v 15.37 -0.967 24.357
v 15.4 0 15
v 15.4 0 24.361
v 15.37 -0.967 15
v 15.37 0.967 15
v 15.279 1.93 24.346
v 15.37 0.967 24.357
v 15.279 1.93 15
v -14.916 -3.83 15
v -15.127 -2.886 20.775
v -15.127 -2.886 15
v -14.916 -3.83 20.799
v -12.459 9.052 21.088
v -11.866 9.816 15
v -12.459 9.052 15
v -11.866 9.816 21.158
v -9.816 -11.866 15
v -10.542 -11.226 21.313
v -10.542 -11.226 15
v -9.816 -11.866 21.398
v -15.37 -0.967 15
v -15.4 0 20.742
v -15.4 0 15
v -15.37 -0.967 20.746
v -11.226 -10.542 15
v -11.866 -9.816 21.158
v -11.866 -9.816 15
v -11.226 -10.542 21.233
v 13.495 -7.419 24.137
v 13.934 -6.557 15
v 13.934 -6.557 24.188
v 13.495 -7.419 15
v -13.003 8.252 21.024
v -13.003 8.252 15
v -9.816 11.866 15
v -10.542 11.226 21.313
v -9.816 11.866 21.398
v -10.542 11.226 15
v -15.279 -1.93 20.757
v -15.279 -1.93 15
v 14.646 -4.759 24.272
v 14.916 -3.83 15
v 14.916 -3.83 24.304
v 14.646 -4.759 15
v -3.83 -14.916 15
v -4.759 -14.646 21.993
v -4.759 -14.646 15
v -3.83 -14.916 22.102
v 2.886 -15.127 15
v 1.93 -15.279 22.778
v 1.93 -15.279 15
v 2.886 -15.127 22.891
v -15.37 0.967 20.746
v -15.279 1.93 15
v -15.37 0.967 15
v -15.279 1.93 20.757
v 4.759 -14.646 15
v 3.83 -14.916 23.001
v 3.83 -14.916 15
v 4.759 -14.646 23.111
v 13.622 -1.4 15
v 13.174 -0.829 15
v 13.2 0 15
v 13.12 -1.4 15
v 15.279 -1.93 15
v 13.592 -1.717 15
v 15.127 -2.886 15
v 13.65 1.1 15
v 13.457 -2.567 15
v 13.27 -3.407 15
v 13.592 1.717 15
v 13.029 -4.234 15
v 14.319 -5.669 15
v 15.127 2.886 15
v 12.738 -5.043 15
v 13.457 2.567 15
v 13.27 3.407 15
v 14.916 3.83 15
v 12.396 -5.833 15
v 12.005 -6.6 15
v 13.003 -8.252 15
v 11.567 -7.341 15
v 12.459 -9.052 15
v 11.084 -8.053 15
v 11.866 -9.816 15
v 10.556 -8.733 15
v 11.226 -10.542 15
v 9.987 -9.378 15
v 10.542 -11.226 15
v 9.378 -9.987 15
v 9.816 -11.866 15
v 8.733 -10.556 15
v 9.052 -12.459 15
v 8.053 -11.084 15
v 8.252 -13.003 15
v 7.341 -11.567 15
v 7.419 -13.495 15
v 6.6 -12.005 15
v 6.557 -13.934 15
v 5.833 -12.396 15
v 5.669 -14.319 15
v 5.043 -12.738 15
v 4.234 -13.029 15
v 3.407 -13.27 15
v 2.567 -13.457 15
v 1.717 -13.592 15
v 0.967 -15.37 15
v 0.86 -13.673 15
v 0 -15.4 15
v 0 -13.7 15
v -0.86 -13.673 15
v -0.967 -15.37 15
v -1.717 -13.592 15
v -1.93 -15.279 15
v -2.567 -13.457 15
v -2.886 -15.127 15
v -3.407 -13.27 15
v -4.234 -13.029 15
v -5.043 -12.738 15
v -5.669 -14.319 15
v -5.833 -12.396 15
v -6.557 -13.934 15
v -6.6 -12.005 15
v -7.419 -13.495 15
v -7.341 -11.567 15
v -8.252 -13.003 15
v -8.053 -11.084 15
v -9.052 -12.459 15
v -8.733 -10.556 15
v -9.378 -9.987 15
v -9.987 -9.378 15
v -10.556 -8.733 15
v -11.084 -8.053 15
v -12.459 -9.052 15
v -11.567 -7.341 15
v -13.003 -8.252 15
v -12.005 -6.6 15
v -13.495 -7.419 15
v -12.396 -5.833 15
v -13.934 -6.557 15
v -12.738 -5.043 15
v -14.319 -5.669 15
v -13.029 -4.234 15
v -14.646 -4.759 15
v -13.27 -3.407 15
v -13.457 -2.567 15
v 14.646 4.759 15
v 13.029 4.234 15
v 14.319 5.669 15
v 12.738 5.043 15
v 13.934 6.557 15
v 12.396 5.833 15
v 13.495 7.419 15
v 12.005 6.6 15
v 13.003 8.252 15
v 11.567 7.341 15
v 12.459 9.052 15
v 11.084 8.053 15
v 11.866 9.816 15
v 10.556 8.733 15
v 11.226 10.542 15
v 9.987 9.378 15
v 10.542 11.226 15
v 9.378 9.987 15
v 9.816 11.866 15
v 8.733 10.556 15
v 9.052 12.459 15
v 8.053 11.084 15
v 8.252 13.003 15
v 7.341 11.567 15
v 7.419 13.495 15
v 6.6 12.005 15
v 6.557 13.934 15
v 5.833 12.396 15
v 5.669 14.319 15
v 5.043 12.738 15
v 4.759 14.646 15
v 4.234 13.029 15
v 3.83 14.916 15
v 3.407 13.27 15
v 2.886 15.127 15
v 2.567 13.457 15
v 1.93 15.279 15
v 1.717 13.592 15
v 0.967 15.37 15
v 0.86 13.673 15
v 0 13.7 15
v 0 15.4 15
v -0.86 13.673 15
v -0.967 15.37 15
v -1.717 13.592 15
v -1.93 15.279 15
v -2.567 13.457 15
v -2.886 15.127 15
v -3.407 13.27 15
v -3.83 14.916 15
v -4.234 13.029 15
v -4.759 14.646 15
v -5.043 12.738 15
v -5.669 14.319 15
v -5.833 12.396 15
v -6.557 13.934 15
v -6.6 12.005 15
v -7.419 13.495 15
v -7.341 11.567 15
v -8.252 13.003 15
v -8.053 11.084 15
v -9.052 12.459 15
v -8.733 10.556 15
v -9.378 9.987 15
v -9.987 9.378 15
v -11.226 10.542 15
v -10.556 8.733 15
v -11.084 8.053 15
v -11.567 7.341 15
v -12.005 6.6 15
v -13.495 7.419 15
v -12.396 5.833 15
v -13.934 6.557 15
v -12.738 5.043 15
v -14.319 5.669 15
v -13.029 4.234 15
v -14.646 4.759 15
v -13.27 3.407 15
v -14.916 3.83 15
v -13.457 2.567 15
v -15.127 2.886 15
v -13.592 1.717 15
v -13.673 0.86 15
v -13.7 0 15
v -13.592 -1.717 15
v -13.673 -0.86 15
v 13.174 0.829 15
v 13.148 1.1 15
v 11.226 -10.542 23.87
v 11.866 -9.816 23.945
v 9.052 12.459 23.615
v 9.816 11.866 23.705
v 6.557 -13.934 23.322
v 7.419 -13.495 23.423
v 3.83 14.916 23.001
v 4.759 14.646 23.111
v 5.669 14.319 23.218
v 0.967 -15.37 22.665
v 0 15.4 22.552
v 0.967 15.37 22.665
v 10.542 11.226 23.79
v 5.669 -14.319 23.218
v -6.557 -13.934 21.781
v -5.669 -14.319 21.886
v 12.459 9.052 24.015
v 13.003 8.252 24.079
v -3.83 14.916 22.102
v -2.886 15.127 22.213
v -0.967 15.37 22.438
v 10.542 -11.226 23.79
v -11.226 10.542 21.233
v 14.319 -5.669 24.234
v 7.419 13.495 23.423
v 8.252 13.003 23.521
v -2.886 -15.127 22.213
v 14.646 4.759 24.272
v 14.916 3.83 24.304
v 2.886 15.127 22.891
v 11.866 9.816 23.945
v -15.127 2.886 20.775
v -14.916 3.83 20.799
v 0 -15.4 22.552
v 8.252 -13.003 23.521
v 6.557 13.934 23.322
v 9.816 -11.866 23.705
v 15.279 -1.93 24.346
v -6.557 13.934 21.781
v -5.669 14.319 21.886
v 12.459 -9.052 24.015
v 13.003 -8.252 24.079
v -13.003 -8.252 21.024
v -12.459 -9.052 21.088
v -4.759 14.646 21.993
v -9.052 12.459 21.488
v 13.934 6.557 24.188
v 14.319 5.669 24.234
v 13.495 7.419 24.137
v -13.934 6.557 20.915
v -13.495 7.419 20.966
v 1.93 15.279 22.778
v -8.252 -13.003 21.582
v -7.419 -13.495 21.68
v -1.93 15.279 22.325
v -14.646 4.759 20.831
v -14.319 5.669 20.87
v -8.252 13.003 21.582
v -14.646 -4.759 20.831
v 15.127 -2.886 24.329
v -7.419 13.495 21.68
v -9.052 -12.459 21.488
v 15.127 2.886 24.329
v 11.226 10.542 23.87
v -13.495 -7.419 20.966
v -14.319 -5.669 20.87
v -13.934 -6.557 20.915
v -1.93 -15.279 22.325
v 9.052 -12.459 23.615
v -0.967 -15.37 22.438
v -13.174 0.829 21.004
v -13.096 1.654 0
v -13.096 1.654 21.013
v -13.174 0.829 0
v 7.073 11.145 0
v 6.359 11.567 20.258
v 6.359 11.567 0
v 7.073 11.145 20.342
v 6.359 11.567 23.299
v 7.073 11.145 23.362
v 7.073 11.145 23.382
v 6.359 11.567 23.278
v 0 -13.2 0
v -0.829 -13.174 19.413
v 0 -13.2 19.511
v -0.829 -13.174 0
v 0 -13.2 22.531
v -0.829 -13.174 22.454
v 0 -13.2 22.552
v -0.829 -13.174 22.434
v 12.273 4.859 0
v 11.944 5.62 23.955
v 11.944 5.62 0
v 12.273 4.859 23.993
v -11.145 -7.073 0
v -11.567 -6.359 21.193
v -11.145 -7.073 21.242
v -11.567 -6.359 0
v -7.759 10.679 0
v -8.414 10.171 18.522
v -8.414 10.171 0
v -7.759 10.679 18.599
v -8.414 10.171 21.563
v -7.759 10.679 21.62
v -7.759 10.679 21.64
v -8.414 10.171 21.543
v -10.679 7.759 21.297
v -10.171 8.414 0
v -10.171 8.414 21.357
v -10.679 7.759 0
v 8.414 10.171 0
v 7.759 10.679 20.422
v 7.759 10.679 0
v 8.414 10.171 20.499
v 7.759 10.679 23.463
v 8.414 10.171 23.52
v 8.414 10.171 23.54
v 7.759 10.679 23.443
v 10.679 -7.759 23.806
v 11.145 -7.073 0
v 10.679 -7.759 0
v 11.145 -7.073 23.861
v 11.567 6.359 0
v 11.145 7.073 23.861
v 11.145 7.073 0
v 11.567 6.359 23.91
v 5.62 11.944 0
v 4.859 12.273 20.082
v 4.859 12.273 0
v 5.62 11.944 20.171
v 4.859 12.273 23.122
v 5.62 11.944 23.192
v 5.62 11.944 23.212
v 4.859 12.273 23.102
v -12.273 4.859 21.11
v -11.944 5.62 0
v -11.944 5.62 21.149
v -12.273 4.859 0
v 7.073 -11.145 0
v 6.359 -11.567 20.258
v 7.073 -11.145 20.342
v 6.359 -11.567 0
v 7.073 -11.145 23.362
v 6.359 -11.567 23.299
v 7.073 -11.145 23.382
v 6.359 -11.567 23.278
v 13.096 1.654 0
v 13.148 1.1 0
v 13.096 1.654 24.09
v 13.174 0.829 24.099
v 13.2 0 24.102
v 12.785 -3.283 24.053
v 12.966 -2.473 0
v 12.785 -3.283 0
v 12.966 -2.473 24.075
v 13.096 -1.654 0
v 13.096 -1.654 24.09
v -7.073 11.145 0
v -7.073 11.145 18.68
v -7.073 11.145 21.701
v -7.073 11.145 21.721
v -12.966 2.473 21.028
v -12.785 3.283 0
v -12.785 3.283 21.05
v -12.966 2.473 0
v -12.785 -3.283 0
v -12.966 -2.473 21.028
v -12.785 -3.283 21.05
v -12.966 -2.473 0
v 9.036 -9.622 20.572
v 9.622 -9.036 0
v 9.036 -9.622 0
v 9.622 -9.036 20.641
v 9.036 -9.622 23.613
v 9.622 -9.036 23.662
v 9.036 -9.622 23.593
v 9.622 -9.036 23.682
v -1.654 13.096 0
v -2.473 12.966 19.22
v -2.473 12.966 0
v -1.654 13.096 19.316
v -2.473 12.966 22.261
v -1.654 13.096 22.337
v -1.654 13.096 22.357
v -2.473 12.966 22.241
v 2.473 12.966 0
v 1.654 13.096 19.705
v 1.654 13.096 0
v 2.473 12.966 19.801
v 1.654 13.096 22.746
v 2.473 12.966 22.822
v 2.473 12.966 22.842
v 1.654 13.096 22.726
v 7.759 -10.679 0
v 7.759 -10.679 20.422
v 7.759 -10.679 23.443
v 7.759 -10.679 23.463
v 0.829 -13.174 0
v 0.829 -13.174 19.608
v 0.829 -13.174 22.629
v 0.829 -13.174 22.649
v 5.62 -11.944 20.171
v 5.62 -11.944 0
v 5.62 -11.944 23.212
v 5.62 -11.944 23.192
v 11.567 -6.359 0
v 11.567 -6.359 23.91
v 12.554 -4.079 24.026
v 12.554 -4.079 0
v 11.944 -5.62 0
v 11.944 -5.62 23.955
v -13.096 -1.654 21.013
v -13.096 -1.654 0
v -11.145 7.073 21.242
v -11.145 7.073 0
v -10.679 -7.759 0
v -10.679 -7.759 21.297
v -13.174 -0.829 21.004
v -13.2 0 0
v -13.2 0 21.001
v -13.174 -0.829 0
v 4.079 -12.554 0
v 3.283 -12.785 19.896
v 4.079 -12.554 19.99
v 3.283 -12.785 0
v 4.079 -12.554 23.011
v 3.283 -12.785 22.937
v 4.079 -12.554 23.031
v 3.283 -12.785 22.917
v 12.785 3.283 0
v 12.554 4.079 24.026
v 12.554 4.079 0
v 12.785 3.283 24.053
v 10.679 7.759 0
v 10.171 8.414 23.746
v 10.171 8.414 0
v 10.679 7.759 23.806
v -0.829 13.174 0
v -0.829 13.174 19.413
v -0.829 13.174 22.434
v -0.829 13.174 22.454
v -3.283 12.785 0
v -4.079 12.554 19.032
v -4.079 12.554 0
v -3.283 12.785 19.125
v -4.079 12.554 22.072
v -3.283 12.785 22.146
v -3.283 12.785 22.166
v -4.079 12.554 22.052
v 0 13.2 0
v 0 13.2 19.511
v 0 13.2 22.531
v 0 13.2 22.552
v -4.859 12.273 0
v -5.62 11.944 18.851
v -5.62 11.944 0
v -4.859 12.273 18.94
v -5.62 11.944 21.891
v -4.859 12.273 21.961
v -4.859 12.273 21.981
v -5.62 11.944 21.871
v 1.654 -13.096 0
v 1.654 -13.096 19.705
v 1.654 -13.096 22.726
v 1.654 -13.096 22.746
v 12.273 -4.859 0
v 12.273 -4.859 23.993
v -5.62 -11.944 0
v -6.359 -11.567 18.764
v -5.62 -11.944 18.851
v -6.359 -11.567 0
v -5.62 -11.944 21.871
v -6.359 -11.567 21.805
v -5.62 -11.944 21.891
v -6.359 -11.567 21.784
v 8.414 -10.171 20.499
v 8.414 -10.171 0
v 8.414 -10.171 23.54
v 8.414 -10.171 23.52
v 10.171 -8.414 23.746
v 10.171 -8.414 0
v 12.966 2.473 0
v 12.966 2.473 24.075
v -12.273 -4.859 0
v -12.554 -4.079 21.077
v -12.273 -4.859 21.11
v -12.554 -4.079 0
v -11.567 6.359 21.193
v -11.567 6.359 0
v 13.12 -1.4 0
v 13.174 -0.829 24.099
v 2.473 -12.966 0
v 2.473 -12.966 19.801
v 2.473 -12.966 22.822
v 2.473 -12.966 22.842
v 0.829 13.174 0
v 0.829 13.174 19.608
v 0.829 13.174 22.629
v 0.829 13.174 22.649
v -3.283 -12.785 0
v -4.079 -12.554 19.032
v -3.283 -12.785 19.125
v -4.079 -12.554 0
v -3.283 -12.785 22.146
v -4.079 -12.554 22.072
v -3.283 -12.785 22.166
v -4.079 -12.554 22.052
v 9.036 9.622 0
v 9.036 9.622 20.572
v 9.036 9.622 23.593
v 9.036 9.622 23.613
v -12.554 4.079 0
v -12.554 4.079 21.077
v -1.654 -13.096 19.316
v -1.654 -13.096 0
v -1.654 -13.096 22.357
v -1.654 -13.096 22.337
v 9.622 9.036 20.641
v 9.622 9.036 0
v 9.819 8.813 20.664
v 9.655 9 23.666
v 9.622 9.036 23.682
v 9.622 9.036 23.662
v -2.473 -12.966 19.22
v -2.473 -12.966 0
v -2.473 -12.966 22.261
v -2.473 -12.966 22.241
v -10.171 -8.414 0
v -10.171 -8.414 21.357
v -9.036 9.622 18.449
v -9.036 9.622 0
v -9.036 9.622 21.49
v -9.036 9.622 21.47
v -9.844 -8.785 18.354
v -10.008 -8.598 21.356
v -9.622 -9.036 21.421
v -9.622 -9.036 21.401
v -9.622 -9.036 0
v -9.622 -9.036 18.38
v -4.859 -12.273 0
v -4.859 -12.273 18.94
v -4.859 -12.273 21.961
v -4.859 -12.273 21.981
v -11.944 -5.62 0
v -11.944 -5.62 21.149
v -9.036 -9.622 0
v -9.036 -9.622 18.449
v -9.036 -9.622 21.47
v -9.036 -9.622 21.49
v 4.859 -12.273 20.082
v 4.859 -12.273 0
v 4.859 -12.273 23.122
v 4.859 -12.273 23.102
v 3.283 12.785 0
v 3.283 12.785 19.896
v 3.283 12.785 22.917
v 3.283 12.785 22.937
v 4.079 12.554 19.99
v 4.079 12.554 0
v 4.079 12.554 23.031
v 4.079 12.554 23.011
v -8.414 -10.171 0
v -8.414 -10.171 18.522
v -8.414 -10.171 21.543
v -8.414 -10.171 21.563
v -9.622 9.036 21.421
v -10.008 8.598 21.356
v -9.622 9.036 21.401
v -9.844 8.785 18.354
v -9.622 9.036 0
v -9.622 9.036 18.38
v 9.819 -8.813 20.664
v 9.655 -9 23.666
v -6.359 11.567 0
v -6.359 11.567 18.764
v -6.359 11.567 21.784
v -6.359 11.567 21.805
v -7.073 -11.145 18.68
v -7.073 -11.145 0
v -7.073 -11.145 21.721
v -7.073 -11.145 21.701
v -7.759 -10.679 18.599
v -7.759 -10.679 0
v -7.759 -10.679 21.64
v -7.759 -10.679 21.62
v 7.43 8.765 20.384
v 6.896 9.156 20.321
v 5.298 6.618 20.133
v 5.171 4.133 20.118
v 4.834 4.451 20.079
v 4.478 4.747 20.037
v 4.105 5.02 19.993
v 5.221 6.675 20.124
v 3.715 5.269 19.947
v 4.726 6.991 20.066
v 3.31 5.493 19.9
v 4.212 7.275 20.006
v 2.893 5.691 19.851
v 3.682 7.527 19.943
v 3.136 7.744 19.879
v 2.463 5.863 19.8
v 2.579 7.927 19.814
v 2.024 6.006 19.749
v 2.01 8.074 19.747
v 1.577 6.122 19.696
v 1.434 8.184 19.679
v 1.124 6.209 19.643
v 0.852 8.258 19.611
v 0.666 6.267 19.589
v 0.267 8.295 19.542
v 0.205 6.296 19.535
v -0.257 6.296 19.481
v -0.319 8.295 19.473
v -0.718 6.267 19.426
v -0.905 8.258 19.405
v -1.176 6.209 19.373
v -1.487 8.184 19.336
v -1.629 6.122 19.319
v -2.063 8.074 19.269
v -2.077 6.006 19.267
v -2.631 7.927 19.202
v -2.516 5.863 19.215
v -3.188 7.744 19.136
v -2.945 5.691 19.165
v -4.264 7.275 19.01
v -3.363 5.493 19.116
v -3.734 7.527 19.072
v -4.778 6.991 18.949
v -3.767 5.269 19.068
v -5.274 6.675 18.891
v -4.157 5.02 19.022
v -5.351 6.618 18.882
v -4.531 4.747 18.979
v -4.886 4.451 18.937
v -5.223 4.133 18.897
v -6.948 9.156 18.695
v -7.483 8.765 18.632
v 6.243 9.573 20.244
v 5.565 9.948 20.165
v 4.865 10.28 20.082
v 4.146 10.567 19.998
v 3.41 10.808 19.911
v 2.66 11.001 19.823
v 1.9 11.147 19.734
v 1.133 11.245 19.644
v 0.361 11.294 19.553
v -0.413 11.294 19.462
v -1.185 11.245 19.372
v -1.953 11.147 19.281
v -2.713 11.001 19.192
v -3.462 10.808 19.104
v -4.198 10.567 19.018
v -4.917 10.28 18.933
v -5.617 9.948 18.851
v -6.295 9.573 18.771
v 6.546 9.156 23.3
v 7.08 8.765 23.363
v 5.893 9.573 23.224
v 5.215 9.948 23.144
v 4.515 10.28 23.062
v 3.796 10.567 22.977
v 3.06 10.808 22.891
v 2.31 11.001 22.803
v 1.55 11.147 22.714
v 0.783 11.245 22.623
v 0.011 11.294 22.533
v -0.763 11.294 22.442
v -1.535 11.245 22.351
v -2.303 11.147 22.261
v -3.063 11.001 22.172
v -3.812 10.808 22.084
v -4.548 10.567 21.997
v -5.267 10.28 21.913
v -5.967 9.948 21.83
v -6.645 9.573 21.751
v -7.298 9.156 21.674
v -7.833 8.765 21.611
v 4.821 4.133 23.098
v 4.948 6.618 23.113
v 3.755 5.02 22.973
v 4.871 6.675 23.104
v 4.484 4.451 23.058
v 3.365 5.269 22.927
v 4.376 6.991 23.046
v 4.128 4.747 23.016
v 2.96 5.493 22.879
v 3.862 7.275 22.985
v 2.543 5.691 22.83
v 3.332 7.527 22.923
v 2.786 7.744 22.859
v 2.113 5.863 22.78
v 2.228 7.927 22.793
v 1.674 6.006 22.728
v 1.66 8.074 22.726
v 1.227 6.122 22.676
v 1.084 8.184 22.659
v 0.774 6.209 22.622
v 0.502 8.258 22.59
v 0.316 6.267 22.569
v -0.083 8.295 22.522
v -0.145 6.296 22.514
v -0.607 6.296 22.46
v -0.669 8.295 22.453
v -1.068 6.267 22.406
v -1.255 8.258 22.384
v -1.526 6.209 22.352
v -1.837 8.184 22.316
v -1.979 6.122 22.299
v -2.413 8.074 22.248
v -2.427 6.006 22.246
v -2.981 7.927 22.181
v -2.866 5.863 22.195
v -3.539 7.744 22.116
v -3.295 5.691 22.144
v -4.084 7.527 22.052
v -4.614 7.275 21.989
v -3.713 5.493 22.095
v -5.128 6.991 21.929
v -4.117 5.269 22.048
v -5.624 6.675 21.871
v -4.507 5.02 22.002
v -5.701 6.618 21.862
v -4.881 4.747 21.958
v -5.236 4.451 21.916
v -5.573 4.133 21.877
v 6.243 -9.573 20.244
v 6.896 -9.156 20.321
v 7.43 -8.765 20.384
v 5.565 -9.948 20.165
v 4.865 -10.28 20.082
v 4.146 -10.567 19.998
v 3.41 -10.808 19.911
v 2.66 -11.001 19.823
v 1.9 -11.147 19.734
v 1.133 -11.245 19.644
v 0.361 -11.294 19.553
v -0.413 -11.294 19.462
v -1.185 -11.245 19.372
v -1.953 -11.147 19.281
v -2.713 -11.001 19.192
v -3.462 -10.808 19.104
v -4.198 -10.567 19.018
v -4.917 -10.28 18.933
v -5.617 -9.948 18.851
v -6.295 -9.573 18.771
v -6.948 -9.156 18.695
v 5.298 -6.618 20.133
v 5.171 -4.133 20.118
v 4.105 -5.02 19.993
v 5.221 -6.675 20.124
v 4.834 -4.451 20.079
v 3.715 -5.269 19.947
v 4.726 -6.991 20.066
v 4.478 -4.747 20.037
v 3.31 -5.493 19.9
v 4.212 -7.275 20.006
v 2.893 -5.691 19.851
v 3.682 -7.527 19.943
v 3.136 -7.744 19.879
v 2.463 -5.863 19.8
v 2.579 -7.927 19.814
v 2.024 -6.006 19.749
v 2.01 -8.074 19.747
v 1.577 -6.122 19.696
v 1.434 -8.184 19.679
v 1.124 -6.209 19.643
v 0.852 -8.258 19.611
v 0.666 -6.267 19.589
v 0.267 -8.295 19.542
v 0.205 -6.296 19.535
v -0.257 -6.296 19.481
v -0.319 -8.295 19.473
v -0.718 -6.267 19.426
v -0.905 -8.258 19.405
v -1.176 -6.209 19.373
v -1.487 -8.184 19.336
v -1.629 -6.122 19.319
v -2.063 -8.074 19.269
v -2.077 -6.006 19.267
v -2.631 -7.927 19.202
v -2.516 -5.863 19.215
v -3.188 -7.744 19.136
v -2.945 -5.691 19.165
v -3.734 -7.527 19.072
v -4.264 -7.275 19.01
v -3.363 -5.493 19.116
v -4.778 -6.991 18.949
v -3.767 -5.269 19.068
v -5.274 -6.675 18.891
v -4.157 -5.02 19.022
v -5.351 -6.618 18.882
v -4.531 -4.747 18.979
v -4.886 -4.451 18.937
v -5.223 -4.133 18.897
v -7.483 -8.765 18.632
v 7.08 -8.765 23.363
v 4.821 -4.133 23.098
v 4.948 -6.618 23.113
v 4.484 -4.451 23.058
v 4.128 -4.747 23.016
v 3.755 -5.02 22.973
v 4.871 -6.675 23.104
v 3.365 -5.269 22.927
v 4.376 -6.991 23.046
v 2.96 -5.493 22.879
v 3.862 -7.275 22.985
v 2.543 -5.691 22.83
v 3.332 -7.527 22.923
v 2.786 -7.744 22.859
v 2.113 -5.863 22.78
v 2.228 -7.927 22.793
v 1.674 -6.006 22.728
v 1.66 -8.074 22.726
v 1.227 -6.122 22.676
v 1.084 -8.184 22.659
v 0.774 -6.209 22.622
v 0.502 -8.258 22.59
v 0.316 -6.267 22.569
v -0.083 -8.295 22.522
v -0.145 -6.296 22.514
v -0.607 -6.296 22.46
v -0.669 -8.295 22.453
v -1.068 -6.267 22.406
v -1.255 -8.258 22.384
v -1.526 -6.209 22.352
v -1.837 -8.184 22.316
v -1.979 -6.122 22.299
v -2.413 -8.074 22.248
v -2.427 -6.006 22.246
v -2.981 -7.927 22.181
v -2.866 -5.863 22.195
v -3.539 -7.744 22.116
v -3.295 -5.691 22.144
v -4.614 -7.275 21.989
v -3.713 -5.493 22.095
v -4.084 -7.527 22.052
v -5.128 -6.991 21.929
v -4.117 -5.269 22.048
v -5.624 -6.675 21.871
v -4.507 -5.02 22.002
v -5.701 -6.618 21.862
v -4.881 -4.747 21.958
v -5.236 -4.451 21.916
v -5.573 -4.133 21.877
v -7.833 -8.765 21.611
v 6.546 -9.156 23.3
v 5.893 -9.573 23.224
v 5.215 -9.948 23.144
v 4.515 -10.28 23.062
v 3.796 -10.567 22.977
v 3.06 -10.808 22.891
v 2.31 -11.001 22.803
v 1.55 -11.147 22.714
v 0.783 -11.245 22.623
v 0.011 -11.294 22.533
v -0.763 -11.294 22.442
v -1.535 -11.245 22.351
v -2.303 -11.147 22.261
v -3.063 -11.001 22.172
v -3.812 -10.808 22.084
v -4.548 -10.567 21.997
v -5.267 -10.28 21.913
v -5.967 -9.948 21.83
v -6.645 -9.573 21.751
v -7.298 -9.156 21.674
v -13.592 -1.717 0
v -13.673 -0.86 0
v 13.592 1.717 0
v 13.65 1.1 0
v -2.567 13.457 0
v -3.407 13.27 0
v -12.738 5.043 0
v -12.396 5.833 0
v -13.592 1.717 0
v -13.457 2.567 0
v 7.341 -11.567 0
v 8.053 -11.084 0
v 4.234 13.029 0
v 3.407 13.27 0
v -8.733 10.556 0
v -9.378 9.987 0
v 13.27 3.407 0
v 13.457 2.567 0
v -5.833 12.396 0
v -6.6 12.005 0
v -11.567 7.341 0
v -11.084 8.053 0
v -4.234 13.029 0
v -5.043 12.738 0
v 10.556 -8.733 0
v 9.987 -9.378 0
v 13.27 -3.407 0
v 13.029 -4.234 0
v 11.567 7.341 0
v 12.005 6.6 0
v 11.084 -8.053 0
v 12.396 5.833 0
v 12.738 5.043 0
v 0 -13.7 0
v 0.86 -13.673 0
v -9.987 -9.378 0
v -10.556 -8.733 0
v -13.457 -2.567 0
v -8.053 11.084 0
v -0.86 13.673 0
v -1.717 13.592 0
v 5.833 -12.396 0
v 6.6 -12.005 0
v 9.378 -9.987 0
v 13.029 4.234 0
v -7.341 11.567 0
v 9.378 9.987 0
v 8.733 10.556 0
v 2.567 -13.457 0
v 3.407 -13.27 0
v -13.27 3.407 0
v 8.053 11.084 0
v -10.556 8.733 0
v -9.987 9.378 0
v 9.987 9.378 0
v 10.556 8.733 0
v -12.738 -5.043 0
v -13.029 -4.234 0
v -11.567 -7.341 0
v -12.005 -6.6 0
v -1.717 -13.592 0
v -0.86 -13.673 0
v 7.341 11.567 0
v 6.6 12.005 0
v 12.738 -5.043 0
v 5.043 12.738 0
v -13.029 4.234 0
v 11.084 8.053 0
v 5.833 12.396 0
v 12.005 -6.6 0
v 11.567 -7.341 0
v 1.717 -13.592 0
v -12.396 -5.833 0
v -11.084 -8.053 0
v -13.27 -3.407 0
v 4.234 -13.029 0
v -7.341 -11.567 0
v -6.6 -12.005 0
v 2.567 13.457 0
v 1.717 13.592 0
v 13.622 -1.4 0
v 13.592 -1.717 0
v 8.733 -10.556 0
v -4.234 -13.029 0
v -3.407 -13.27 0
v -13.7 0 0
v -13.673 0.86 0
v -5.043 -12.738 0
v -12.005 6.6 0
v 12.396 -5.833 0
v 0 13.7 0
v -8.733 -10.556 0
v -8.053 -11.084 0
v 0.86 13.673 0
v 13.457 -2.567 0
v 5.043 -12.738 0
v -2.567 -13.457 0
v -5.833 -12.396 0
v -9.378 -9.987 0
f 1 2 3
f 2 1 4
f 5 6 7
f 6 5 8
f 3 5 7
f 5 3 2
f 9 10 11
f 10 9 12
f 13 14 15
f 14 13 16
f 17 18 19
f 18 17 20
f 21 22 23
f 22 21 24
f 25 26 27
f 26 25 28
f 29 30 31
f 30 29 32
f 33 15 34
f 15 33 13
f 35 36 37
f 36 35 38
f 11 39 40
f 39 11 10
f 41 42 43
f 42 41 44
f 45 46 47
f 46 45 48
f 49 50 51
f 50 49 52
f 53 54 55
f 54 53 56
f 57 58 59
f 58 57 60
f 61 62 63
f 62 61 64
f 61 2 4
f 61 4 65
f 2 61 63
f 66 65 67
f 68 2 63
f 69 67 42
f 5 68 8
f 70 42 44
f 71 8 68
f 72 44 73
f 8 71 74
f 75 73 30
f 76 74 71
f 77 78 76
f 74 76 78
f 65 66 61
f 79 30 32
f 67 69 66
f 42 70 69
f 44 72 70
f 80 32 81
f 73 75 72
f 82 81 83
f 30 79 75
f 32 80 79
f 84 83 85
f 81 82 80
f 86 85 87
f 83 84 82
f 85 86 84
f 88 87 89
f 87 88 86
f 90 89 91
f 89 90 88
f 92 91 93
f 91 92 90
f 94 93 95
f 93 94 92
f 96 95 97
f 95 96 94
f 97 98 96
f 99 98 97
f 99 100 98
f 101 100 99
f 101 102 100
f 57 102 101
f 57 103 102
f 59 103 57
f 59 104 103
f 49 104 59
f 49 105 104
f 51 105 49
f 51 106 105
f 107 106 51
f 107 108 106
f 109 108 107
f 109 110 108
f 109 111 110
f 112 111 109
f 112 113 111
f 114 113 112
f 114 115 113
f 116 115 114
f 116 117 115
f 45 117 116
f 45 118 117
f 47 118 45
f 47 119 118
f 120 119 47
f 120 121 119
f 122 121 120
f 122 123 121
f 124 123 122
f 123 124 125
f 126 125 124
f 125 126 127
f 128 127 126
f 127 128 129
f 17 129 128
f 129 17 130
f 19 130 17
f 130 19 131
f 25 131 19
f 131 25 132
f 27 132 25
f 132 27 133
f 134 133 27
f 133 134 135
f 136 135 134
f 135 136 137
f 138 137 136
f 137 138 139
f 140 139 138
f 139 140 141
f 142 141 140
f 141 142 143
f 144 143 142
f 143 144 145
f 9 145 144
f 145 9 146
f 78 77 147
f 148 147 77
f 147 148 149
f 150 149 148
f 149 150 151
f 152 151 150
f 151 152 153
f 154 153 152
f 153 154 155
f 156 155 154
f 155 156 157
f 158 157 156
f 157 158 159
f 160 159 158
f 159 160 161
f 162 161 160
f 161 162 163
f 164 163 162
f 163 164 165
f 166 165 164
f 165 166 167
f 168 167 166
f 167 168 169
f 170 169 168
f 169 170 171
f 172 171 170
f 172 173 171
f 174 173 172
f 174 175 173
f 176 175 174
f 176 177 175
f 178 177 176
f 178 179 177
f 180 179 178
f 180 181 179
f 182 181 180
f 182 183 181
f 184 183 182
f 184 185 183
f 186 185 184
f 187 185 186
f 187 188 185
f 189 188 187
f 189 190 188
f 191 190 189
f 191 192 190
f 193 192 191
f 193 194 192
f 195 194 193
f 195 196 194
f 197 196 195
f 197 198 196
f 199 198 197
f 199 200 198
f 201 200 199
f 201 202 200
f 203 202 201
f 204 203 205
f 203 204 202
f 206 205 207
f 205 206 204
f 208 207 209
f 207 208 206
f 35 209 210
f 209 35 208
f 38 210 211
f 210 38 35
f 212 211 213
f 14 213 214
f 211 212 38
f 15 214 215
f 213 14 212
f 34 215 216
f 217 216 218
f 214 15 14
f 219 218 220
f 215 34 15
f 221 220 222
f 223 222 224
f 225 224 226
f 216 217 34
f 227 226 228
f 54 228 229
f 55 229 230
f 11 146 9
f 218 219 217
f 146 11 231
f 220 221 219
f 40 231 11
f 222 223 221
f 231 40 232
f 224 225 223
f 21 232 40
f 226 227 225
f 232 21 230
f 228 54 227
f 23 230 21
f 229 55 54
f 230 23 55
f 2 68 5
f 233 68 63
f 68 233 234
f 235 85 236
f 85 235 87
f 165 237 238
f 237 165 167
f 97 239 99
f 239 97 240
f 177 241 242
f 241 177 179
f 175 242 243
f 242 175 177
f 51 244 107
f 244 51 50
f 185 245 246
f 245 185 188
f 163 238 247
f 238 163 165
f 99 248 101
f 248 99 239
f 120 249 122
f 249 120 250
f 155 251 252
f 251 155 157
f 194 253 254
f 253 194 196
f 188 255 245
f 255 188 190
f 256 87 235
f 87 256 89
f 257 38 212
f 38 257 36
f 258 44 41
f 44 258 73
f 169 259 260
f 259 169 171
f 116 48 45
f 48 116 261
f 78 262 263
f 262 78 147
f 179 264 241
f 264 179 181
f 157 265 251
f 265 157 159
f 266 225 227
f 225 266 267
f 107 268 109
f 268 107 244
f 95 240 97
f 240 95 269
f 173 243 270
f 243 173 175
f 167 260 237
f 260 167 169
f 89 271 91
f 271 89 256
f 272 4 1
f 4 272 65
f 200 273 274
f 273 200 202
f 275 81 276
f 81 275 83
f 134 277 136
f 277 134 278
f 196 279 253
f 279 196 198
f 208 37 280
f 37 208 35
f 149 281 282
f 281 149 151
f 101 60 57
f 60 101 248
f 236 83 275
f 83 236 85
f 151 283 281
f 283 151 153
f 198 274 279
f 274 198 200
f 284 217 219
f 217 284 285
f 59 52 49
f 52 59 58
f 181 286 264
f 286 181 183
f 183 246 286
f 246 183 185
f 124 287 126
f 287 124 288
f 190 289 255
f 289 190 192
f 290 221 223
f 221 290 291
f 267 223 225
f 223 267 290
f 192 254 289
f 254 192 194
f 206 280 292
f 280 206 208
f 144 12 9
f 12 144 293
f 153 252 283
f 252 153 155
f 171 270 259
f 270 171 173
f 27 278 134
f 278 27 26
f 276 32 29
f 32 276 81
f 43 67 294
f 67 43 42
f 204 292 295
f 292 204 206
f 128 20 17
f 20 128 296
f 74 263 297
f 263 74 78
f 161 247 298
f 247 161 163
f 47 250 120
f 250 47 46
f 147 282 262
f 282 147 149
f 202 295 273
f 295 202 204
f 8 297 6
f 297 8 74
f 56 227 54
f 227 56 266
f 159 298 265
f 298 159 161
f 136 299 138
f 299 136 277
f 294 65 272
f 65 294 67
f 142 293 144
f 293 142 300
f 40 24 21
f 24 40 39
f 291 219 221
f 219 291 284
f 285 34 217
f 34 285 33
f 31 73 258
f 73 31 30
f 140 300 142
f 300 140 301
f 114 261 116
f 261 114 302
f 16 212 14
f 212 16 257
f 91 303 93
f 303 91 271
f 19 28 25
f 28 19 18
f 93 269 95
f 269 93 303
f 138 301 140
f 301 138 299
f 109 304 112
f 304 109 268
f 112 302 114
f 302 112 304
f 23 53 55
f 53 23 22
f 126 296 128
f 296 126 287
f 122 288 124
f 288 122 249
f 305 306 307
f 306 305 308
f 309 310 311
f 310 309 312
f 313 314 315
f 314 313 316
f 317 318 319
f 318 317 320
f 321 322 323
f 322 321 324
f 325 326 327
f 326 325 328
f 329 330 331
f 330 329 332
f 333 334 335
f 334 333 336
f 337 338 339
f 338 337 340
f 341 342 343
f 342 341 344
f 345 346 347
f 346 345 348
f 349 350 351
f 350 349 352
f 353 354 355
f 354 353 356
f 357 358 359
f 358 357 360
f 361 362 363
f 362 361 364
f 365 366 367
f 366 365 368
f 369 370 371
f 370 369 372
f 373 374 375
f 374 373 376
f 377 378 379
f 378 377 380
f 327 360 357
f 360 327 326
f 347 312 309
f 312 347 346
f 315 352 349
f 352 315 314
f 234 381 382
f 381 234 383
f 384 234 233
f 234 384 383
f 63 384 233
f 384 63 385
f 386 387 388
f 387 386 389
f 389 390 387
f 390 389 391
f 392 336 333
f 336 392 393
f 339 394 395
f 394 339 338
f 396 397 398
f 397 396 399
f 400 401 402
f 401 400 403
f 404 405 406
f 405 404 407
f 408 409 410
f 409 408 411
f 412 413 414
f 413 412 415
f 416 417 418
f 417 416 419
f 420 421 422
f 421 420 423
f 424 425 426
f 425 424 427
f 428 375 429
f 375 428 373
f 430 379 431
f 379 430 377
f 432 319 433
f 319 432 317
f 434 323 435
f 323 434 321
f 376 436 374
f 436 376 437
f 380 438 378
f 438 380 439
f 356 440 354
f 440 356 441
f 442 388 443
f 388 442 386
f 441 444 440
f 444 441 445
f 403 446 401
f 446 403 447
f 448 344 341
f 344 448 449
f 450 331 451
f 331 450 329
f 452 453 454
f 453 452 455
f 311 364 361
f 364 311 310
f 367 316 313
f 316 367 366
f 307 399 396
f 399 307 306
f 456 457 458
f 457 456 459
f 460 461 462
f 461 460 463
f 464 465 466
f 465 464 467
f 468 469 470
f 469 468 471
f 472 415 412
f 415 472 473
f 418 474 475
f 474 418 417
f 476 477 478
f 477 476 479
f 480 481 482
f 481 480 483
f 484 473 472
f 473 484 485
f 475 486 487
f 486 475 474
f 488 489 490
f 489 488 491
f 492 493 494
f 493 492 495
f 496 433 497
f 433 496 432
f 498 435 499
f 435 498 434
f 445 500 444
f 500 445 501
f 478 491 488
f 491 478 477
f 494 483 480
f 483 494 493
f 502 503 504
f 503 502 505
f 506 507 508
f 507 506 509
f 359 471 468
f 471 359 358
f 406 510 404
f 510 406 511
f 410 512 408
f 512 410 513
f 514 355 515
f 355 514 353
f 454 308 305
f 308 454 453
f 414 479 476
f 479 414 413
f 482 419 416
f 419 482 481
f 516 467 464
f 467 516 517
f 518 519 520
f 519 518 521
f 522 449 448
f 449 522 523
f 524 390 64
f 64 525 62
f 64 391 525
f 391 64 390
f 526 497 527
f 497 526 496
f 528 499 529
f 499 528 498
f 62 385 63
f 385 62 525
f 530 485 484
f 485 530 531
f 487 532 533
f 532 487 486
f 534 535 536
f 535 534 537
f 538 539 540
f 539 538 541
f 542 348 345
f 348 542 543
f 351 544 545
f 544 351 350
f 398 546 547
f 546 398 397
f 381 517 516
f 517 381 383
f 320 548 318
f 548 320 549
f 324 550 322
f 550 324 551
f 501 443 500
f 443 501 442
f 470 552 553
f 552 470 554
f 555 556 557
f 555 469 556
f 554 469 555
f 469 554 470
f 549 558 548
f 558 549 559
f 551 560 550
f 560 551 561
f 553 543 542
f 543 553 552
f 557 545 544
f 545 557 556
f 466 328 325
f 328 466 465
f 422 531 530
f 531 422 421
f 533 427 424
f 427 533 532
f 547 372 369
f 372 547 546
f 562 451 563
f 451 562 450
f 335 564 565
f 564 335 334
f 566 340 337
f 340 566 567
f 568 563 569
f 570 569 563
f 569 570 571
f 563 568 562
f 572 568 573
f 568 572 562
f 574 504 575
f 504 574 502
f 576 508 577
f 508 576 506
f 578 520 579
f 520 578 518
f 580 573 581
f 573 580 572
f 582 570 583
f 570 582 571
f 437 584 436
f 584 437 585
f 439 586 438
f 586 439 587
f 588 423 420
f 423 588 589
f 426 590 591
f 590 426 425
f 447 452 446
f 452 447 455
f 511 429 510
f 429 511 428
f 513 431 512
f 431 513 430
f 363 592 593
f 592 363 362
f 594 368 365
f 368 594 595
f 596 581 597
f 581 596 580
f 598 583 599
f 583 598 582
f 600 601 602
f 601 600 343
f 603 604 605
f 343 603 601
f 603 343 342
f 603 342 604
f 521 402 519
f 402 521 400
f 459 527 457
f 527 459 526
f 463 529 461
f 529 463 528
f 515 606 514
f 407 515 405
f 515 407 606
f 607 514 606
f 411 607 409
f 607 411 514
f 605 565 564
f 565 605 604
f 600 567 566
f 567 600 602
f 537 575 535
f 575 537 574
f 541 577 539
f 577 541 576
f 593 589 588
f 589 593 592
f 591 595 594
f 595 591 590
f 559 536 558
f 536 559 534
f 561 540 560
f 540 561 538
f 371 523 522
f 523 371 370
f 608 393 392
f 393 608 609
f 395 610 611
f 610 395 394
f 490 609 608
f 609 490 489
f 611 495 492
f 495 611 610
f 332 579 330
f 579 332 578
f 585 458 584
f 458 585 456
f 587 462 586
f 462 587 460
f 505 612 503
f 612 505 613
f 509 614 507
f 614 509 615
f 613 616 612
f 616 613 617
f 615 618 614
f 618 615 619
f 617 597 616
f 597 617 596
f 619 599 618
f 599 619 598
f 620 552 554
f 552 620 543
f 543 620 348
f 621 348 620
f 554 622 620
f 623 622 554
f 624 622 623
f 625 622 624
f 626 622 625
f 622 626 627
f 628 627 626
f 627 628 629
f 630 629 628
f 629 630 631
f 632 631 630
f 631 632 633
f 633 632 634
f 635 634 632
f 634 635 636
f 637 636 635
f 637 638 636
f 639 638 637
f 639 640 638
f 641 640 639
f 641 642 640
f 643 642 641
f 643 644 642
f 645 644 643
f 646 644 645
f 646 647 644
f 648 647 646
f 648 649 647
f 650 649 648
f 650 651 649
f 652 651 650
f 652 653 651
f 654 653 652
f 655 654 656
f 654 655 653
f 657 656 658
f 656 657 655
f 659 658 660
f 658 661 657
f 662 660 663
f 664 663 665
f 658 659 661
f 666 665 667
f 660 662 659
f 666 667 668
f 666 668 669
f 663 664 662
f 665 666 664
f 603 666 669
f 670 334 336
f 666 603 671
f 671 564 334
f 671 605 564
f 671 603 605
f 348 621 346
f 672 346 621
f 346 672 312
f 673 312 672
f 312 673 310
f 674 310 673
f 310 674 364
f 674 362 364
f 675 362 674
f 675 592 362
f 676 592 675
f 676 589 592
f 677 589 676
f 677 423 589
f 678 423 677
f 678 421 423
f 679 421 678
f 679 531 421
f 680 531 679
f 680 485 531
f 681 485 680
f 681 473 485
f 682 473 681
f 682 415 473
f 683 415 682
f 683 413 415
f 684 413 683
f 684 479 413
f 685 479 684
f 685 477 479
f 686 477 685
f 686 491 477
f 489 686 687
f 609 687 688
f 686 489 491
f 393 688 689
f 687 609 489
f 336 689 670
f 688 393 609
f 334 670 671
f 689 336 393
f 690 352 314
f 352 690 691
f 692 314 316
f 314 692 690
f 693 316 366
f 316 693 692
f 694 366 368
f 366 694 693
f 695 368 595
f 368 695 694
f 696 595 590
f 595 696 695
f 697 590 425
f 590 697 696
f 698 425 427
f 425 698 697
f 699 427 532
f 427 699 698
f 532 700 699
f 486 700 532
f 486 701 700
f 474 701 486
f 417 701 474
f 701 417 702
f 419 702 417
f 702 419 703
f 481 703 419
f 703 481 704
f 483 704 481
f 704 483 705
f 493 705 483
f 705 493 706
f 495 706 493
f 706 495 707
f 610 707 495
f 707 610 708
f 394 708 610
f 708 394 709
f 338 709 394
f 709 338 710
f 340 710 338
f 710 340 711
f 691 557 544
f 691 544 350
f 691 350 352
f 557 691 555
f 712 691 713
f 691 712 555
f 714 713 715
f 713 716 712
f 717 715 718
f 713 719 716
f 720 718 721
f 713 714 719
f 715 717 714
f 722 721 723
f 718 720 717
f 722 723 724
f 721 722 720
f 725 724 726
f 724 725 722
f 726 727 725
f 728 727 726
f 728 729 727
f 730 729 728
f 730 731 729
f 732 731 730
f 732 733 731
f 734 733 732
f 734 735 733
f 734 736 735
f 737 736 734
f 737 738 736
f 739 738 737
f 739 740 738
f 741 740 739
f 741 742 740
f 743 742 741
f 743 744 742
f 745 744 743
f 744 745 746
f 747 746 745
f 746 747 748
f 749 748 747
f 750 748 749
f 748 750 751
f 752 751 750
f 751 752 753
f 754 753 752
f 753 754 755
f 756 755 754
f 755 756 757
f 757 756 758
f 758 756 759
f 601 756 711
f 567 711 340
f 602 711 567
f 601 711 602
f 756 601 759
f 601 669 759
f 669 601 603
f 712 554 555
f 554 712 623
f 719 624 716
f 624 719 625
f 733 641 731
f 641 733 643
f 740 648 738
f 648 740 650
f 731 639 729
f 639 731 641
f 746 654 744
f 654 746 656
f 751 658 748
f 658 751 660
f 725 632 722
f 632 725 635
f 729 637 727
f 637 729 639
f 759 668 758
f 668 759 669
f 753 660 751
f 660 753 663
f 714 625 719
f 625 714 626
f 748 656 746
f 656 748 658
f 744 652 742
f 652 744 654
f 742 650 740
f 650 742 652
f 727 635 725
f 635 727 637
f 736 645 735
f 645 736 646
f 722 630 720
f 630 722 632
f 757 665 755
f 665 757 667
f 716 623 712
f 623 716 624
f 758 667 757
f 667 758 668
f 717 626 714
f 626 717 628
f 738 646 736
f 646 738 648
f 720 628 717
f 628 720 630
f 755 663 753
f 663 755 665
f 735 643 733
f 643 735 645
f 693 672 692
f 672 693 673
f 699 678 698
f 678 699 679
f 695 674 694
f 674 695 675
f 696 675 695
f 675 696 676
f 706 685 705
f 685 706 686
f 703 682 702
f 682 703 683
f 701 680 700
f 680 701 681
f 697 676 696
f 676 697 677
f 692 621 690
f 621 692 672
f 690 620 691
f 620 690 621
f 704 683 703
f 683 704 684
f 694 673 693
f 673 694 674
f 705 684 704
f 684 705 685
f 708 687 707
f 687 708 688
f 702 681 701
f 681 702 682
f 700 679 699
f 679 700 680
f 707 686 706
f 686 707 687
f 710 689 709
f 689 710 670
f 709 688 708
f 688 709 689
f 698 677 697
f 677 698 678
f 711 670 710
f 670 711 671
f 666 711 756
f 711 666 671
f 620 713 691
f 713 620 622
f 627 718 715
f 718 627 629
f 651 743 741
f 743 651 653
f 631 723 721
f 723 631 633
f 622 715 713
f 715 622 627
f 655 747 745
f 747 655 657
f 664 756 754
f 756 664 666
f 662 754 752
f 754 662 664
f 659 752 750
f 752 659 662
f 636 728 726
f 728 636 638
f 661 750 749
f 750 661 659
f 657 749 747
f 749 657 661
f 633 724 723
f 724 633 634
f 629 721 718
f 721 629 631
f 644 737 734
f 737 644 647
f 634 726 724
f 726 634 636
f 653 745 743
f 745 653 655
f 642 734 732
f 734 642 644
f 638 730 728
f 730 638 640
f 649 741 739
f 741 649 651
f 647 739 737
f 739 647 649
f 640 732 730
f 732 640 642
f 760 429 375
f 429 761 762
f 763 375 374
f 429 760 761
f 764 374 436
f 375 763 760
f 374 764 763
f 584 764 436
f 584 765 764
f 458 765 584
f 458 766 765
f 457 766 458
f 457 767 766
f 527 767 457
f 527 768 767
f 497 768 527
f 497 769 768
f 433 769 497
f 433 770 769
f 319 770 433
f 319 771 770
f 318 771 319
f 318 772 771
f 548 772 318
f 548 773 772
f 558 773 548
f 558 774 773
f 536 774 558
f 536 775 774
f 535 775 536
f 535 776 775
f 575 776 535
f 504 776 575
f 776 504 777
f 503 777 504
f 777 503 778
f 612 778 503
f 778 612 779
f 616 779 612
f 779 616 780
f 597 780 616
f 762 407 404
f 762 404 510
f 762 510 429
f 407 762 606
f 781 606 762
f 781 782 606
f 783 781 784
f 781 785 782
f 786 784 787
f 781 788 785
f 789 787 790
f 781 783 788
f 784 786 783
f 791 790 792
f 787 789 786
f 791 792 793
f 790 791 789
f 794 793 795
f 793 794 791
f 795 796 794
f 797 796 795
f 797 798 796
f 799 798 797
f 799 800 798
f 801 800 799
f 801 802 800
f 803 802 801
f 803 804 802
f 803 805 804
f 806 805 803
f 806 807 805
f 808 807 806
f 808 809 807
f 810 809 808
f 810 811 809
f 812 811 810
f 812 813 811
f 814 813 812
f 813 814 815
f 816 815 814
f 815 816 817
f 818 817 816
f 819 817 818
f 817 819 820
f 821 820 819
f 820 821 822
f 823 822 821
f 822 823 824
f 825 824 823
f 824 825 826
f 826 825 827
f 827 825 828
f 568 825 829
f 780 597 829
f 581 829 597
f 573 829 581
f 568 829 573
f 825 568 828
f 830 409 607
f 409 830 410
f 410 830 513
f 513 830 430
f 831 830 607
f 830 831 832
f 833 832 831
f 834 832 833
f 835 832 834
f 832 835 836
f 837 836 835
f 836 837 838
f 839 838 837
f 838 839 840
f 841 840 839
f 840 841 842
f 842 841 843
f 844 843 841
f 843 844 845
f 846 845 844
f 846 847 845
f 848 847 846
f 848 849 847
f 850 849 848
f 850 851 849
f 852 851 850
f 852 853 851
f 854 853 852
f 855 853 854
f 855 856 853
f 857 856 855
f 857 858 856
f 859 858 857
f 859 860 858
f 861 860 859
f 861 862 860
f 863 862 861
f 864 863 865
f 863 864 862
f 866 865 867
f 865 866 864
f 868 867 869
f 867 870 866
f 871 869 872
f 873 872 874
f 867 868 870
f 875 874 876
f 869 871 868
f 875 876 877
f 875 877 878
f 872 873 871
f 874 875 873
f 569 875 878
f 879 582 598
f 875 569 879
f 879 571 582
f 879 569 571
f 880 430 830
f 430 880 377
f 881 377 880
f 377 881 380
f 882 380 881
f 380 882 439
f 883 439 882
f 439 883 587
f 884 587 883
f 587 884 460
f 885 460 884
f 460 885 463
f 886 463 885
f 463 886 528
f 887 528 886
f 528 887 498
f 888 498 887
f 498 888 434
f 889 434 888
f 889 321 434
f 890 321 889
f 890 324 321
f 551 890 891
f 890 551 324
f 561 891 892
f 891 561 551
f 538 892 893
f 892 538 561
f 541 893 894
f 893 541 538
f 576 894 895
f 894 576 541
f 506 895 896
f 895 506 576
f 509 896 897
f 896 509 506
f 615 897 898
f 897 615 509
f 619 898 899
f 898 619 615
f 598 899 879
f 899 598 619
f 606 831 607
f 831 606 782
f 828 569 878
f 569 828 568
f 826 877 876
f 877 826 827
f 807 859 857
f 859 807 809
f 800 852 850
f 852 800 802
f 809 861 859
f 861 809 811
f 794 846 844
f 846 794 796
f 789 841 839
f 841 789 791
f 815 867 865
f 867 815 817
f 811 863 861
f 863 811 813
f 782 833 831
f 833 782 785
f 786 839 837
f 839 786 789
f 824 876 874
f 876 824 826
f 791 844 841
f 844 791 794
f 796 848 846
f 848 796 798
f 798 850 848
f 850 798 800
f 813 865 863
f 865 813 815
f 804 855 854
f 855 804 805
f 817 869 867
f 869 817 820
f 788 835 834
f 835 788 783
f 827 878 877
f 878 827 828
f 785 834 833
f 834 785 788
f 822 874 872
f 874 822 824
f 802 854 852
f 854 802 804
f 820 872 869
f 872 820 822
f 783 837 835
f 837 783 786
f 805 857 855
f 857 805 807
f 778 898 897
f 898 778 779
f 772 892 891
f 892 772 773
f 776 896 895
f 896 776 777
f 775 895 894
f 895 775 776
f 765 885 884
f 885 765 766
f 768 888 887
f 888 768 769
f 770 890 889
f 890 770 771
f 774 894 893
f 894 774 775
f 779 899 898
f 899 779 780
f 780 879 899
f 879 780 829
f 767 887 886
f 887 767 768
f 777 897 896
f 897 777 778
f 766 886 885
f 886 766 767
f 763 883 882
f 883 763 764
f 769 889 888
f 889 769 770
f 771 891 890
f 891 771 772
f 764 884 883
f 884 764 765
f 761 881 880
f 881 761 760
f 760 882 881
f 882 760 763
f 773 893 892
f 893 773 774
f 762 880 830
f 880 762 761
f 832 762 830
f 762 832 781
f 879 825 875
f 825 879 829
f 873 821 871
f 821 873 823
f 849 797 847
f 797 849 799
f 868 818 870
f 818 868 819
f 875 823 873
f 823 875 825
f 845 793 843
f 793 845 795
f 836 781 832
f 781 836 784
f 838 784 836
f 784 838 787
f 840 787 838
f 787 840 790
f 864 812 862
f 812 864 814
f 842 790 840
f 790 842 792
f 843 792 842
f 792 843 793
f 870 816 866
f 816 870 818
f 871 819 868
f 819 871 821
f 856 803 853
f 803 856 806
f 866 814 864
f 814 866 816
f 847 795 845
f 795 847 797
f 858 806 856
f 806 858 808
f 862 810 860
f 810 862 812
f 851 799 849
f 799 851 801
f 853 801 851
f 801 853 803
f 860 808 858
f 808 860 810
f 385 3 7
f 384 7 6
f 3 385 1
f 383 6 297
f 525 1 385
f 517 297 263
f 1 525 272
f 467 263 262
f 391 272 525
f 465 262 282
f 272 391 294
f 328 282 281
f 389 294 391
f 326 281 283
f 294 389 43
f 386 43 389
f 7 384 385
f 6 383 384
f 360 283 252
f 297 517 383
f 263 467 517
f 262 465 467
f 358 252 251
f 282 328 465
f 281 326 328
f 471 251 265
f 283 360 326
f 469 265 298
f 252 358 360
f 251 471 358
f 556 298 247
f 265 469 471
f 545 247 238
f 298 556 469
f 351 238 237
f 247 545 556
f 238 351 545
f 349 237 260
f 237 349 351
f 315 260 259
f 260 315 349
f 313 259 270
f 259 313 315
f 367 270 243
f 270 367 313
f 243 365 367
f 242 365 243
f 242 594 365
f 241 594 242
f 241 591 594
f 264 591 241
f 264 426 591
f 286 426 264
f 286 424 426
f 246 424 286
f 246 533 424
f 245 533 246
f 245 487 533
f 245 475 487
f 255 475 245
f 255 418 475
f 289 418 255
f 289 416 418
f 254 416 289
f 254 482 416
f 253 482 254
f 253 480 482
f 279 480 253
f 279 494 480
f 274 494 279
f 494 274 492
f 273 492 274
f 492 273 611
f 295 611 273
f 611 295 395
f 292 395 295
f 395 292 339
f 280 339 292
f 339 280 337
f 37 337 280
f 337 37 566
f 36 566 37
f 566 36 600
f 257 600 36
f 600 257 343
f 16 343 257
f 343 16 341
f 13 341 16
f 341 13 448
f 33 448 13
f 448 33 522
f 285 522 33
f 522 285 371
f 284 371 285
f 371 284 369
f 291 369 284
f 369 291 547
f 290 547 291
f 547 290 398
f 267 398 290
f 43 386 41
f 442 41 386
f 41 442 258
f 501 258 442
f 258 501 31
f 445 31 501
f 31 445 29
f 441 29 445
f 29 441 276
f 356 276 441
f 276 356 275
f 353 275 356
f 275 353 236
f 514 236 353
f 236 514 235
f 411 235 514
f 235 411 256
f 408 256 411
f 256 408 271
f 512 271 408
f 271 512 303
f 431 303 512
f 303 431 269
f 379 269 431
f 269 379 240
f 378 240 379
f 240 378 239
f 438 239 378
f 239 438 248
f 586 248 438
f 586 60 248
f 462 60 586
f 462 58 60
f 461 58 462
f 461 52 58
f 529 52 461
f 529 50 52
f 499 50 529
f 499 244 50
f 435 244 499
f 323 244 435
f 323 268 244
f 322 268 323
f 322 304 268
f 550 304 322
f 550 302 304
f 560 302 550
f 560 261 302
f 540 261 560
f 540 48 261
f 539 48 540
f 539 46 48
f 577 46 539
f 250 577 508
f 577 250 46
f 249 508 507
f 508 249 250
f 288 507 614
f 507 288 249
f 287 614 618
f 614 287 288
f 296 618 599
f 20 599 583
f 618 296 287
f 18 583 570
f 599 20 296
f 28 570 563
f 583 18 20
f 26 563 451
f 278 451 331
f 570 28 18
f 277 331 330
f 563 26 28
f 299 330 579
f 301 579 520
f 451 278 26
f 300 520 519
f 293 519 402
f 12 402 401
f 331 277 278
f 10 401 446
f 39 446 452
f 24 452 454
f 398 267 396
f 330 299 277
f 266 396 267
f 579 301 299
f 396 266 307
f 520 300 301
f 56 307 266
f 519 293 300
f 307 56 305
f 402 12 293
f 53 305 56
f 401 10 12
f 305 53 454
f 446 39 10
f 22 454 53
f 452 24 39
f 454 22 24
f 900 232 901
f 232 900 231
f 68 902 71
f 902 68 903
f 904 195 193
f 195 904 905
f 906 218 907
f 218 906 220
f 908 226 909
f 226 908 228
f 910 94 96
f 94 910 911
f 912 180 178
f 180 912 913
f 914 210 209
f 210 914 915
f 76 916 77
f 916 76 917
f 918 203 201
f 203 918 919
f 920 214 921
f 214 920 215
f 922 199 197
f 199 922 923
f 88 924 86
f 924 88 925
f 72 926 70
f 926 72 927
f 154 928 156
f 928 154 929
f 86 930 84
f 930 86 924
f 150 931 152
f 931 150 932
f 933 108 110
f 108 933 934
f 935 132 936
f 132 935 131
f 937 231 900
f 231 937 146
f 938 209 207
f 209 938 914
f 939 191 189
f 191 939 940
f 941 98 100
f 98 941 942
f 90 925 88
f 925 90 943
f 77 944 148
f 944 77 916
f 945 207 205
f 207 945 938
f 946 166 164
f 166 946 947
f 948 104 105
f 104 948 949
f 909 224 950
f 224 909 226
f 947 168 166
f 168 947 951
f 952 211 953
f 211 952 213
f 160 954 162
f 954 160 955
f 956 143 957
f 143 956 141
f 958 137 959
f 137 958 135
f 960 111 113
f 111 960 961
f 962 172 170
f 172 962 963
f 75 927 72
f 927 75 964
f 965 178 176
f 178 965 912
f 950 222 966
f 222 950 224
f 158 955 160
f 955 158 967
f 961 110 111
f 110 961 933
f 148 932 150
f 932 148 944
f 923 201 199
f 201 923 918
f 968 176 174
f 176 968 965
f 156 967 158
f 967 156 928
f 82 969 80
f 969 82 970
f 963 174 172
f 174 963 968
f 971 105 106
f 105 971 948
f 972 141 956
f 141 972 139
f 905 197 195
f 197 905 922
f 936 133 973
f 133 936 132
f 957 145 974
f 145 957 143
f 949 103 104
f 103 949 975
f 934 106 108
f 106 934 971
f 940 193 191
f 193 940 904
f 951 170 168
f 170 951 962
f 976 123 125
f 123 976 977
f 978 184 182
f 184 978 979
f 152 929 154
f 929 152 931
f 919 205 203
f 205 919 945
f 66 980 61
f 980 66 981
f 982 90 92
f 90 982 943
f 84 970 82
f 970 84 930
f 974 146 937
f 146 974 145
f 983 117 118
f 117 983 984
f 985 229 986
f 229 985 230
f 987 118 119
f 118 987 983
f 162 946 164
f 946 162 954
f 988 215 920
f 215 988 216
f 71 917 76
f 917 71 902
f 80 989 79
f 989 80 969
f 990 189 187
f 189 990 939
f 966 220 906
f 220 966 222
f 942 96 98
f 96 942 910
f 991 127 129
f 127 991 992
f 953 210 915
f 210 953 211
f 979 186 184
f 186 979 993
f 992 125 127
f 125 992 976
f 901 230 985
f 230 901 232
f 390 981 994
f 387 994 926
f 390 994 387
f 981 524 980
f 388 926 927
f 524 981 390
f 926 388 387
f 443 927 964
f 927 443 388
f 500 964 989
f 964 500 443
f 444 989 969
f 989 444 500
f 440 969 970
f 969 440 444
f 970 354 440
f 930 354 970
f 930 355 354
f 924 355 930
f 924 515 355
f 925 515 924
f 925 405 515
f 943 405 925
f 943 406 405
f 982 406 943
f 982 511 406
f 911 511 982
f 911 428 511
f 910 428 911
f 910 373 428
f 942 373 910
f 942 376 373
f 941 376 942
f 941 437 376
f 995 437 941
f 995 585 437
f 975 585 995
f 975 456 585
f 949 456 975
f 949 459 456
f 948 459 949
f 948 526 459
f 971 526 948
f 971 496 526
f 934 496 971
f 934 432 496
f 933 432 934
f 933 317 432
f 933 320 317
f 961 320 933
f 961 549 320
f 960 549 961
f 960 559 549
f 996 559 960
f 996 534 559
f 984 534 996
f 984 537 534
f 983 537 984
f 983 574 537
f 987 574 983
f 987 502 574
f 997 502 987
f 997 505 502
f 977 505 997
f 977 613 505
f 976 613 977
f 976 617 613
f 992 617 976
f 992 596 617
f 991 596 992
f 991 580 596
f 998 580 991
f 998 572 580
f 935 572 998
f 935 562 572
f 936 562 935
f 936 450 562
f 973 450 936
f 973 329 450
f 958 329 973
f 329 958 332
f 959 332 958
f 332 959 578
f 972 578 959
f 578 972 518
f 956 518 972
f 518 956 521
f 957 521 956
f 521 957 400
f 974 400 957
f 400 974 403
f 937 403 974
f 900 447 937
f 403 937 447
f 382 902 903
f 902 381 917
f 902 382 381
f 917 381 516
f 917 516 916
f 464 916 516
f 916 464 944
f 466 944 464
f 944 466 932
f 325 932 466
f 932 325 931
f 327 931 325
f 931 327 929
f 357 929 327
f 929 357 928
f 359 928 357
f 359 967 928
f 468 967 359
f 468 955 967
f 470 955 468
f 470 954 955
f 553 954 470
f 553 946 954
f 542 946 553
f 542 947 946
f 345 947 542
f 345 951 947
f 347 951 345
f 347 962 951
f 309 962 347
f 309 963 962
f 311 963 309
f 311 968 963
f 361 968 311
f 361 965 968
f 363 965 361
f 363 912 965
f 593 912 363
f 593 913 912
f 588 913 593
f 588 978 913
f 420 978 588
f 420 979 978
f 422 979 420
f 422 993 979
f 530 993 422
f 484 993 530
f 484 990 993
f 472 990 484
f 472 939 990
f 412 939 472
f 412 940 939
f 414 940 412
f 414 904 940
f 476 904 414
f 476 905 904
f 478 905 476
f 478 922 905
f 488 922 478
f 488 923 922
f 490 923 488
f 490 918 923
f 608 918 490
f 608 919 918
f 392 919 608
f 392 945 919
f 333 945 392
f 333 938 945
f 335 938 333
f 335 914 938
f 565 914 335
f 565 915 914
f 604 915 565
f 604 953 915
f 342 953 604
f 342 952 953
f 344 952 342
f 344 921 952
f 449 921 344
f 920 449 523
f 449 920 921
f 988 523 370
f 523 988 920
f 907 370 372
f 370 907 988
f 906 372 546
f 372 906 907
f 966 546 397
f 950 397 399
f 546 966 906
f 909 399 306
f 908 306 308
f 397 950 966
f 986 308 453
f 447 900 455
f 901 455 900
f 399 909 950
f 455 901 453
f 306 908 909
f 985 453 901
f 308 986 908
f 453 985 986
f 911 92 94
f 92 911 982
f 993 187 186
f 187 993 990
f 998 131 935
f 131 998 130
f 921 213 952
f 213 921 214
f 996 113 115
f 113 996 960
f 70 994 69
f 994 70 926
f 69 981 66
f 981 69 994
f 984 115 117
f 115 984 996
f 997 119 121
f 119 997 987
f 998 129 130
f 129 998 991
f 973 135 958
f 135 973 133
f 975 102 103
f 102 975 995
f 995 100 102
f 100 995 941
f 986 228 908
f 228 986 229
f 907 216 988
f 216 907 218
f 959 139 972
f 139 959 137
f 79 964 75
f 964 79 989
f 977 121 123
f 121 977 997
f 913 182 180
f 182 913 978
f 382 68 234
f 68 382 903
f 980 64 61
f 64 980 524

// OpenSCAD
facets = 100;

upper_cylinder_radius = 15.4;
upper_cylinder_height = 10;
upper_cylinder_wall_thickness = 1;

lower_cylinder_radius = 13.7;
lower_cylinder_height = 15;
lower_cylinder_wall_thickness = 0.5;

flange_cylinder_height = 3;
flange_outer_radius = upper_cylinder_radius - upper_cylinder_wall_thickness;
flange_width = 5;
flange_inner_radius = (flange_outer_radius - flange_width)-2;
flange_channel_width = 3;
flange_wall_width = flange_width - flange_channel_width;


// attachment for control pod, angled surface
module upper_cylinder() {
  difference() {
    union() {
      difference() {
        cylinder(h=upper_cylinder_height, r=upper_cylinder_radius, $fn=facets);
      
        // create a second smaller cylinder to ensure enough overlap in print
        // to solidly join upper to lower
        // joint_inner_radius = upper_cylinder_radius - (
        //   upper_cylinder_radius - lower_cylinder_radius
        // )-lower_cylinder_wall_thickness;
        // cylinder(h=upper_cylinder_height, r=joint_inner_radius, $fn=facets);

        // translate([0, 0, 1]) {
          cylinder(h=upper_cylinder_height, r=lower_cylinder_radius-lower_cylinder_wall_thickness, $fn=facets);
        // }
        
        // no tapered width  
        //cylinder(h=upper_cylinder_height, r=upper_cylinder_radius, $fn=facets);
        //cylinder(h=upper_cylinder_height, r=lower_cylinder_radius-lower_cylinder_wall_thickness, $fn=facets);
      }

      // draw flanges
      rotate([0, -6.7, 0]) {
        // the z of the transform needs to put the flange piece very slightly
        // lower than the top of the enclosing cylinder or else the printer
        // won't properly print both the cylinder and the flanges.
        translate([0.5, -1.1, (upper_cylinder_height-flange_cylinder_height)*0.64]) {
          rotate([0,0,45]) {
            flange();
          }
        }
          
        // the z of the transform needs to put the flange piece very slightly
        // lower than the top of the enclosing cylinder or else the printer
        // won't properly print both the cylinder and the flanges.
        translate([0.5, 1.1, (upper_cylinder_height-flange_cylinder_height)*0.64]) {
          rotate([0,0,225]) {
            flange();
          }
        }
      }
    }

    // angle the top
    rotate([0, -6.7, 0]) {
      translate([-upper_cylinder_radius,-upper_cylinder_radius,+7.5]) {
        cube([upper_cylinder_radius*2.2,upper_cylinder_radius*2, 5]); 
      }
    }
  }
}

// anchor to inside of handle, includes centering notch
module lower_cylinder() {
  difference() {
    difference() {
      cylinder(h=lower_cylinder_height, r=lower_cylinder_radius, $fn=facets);
      cylinder(h=lower_cylinder_height, r=lower_cylinder_radius-lower_cylinder_wall_thickness, $fn=facets);
    }

    // create the notch
    translate([lower_cylinder_radius-(lower_cylinder_wall_thickness*1.2),-1.4,0]) {
      cube([1.6,2.5,lower_cylinder_height]);
    }
  }
}

// radial screw channel flange
module flange() {
  difference() {

    // flange segment
    difference() {
      intersection() {
        rotate_extrude($fn=facets) {
          square([flange_outer_radius,flange_cylinder_height]);
        }
        
        cube([flange_outer_radius*1.5,flange_outer_radius*1.5,flange_cylinder_height]);
      }
    

      intersection(){
        rotate_extrude($fn=facets) {
          square([flange_inner_radius,flange_cylinder_height]);
        }
        
        cube([flange_outer_radius*1.5,flange_outer_radius*1.5,flange_cylinder_height]);

      }
    }

    // flange channel
    difference() {
      intersection() {
        rotate_extrude($fn=facets) {
          square([flange_outer_radius-flange_wall_width,flange_cylinder_height]);
        }
        
        translate([flange_width/flange_channel_width, flange_width/flange_channel_width, 0]) {
          cube([flange_outer_radius*1.5,flange_outer_radius*1.5,flange_cylinder_height]);
        }
      }
    

      intersection(){
        rotate_extrude($fn=facets) {
          square([flange_inner_radius+flange_wall_width,flange_cylinder_height]);
        }
        
        cube([flange_outer_radius*1.5,flange_outer_radius*1.5,flange_cylinder_height]);

      }
    }
  }
}

module full_insert() {
  translate([0, 0, lower_cylinder_height]) {
    upper_cylinder();
  }

  lower_cylinder();

}

full_insert();
// flange();
